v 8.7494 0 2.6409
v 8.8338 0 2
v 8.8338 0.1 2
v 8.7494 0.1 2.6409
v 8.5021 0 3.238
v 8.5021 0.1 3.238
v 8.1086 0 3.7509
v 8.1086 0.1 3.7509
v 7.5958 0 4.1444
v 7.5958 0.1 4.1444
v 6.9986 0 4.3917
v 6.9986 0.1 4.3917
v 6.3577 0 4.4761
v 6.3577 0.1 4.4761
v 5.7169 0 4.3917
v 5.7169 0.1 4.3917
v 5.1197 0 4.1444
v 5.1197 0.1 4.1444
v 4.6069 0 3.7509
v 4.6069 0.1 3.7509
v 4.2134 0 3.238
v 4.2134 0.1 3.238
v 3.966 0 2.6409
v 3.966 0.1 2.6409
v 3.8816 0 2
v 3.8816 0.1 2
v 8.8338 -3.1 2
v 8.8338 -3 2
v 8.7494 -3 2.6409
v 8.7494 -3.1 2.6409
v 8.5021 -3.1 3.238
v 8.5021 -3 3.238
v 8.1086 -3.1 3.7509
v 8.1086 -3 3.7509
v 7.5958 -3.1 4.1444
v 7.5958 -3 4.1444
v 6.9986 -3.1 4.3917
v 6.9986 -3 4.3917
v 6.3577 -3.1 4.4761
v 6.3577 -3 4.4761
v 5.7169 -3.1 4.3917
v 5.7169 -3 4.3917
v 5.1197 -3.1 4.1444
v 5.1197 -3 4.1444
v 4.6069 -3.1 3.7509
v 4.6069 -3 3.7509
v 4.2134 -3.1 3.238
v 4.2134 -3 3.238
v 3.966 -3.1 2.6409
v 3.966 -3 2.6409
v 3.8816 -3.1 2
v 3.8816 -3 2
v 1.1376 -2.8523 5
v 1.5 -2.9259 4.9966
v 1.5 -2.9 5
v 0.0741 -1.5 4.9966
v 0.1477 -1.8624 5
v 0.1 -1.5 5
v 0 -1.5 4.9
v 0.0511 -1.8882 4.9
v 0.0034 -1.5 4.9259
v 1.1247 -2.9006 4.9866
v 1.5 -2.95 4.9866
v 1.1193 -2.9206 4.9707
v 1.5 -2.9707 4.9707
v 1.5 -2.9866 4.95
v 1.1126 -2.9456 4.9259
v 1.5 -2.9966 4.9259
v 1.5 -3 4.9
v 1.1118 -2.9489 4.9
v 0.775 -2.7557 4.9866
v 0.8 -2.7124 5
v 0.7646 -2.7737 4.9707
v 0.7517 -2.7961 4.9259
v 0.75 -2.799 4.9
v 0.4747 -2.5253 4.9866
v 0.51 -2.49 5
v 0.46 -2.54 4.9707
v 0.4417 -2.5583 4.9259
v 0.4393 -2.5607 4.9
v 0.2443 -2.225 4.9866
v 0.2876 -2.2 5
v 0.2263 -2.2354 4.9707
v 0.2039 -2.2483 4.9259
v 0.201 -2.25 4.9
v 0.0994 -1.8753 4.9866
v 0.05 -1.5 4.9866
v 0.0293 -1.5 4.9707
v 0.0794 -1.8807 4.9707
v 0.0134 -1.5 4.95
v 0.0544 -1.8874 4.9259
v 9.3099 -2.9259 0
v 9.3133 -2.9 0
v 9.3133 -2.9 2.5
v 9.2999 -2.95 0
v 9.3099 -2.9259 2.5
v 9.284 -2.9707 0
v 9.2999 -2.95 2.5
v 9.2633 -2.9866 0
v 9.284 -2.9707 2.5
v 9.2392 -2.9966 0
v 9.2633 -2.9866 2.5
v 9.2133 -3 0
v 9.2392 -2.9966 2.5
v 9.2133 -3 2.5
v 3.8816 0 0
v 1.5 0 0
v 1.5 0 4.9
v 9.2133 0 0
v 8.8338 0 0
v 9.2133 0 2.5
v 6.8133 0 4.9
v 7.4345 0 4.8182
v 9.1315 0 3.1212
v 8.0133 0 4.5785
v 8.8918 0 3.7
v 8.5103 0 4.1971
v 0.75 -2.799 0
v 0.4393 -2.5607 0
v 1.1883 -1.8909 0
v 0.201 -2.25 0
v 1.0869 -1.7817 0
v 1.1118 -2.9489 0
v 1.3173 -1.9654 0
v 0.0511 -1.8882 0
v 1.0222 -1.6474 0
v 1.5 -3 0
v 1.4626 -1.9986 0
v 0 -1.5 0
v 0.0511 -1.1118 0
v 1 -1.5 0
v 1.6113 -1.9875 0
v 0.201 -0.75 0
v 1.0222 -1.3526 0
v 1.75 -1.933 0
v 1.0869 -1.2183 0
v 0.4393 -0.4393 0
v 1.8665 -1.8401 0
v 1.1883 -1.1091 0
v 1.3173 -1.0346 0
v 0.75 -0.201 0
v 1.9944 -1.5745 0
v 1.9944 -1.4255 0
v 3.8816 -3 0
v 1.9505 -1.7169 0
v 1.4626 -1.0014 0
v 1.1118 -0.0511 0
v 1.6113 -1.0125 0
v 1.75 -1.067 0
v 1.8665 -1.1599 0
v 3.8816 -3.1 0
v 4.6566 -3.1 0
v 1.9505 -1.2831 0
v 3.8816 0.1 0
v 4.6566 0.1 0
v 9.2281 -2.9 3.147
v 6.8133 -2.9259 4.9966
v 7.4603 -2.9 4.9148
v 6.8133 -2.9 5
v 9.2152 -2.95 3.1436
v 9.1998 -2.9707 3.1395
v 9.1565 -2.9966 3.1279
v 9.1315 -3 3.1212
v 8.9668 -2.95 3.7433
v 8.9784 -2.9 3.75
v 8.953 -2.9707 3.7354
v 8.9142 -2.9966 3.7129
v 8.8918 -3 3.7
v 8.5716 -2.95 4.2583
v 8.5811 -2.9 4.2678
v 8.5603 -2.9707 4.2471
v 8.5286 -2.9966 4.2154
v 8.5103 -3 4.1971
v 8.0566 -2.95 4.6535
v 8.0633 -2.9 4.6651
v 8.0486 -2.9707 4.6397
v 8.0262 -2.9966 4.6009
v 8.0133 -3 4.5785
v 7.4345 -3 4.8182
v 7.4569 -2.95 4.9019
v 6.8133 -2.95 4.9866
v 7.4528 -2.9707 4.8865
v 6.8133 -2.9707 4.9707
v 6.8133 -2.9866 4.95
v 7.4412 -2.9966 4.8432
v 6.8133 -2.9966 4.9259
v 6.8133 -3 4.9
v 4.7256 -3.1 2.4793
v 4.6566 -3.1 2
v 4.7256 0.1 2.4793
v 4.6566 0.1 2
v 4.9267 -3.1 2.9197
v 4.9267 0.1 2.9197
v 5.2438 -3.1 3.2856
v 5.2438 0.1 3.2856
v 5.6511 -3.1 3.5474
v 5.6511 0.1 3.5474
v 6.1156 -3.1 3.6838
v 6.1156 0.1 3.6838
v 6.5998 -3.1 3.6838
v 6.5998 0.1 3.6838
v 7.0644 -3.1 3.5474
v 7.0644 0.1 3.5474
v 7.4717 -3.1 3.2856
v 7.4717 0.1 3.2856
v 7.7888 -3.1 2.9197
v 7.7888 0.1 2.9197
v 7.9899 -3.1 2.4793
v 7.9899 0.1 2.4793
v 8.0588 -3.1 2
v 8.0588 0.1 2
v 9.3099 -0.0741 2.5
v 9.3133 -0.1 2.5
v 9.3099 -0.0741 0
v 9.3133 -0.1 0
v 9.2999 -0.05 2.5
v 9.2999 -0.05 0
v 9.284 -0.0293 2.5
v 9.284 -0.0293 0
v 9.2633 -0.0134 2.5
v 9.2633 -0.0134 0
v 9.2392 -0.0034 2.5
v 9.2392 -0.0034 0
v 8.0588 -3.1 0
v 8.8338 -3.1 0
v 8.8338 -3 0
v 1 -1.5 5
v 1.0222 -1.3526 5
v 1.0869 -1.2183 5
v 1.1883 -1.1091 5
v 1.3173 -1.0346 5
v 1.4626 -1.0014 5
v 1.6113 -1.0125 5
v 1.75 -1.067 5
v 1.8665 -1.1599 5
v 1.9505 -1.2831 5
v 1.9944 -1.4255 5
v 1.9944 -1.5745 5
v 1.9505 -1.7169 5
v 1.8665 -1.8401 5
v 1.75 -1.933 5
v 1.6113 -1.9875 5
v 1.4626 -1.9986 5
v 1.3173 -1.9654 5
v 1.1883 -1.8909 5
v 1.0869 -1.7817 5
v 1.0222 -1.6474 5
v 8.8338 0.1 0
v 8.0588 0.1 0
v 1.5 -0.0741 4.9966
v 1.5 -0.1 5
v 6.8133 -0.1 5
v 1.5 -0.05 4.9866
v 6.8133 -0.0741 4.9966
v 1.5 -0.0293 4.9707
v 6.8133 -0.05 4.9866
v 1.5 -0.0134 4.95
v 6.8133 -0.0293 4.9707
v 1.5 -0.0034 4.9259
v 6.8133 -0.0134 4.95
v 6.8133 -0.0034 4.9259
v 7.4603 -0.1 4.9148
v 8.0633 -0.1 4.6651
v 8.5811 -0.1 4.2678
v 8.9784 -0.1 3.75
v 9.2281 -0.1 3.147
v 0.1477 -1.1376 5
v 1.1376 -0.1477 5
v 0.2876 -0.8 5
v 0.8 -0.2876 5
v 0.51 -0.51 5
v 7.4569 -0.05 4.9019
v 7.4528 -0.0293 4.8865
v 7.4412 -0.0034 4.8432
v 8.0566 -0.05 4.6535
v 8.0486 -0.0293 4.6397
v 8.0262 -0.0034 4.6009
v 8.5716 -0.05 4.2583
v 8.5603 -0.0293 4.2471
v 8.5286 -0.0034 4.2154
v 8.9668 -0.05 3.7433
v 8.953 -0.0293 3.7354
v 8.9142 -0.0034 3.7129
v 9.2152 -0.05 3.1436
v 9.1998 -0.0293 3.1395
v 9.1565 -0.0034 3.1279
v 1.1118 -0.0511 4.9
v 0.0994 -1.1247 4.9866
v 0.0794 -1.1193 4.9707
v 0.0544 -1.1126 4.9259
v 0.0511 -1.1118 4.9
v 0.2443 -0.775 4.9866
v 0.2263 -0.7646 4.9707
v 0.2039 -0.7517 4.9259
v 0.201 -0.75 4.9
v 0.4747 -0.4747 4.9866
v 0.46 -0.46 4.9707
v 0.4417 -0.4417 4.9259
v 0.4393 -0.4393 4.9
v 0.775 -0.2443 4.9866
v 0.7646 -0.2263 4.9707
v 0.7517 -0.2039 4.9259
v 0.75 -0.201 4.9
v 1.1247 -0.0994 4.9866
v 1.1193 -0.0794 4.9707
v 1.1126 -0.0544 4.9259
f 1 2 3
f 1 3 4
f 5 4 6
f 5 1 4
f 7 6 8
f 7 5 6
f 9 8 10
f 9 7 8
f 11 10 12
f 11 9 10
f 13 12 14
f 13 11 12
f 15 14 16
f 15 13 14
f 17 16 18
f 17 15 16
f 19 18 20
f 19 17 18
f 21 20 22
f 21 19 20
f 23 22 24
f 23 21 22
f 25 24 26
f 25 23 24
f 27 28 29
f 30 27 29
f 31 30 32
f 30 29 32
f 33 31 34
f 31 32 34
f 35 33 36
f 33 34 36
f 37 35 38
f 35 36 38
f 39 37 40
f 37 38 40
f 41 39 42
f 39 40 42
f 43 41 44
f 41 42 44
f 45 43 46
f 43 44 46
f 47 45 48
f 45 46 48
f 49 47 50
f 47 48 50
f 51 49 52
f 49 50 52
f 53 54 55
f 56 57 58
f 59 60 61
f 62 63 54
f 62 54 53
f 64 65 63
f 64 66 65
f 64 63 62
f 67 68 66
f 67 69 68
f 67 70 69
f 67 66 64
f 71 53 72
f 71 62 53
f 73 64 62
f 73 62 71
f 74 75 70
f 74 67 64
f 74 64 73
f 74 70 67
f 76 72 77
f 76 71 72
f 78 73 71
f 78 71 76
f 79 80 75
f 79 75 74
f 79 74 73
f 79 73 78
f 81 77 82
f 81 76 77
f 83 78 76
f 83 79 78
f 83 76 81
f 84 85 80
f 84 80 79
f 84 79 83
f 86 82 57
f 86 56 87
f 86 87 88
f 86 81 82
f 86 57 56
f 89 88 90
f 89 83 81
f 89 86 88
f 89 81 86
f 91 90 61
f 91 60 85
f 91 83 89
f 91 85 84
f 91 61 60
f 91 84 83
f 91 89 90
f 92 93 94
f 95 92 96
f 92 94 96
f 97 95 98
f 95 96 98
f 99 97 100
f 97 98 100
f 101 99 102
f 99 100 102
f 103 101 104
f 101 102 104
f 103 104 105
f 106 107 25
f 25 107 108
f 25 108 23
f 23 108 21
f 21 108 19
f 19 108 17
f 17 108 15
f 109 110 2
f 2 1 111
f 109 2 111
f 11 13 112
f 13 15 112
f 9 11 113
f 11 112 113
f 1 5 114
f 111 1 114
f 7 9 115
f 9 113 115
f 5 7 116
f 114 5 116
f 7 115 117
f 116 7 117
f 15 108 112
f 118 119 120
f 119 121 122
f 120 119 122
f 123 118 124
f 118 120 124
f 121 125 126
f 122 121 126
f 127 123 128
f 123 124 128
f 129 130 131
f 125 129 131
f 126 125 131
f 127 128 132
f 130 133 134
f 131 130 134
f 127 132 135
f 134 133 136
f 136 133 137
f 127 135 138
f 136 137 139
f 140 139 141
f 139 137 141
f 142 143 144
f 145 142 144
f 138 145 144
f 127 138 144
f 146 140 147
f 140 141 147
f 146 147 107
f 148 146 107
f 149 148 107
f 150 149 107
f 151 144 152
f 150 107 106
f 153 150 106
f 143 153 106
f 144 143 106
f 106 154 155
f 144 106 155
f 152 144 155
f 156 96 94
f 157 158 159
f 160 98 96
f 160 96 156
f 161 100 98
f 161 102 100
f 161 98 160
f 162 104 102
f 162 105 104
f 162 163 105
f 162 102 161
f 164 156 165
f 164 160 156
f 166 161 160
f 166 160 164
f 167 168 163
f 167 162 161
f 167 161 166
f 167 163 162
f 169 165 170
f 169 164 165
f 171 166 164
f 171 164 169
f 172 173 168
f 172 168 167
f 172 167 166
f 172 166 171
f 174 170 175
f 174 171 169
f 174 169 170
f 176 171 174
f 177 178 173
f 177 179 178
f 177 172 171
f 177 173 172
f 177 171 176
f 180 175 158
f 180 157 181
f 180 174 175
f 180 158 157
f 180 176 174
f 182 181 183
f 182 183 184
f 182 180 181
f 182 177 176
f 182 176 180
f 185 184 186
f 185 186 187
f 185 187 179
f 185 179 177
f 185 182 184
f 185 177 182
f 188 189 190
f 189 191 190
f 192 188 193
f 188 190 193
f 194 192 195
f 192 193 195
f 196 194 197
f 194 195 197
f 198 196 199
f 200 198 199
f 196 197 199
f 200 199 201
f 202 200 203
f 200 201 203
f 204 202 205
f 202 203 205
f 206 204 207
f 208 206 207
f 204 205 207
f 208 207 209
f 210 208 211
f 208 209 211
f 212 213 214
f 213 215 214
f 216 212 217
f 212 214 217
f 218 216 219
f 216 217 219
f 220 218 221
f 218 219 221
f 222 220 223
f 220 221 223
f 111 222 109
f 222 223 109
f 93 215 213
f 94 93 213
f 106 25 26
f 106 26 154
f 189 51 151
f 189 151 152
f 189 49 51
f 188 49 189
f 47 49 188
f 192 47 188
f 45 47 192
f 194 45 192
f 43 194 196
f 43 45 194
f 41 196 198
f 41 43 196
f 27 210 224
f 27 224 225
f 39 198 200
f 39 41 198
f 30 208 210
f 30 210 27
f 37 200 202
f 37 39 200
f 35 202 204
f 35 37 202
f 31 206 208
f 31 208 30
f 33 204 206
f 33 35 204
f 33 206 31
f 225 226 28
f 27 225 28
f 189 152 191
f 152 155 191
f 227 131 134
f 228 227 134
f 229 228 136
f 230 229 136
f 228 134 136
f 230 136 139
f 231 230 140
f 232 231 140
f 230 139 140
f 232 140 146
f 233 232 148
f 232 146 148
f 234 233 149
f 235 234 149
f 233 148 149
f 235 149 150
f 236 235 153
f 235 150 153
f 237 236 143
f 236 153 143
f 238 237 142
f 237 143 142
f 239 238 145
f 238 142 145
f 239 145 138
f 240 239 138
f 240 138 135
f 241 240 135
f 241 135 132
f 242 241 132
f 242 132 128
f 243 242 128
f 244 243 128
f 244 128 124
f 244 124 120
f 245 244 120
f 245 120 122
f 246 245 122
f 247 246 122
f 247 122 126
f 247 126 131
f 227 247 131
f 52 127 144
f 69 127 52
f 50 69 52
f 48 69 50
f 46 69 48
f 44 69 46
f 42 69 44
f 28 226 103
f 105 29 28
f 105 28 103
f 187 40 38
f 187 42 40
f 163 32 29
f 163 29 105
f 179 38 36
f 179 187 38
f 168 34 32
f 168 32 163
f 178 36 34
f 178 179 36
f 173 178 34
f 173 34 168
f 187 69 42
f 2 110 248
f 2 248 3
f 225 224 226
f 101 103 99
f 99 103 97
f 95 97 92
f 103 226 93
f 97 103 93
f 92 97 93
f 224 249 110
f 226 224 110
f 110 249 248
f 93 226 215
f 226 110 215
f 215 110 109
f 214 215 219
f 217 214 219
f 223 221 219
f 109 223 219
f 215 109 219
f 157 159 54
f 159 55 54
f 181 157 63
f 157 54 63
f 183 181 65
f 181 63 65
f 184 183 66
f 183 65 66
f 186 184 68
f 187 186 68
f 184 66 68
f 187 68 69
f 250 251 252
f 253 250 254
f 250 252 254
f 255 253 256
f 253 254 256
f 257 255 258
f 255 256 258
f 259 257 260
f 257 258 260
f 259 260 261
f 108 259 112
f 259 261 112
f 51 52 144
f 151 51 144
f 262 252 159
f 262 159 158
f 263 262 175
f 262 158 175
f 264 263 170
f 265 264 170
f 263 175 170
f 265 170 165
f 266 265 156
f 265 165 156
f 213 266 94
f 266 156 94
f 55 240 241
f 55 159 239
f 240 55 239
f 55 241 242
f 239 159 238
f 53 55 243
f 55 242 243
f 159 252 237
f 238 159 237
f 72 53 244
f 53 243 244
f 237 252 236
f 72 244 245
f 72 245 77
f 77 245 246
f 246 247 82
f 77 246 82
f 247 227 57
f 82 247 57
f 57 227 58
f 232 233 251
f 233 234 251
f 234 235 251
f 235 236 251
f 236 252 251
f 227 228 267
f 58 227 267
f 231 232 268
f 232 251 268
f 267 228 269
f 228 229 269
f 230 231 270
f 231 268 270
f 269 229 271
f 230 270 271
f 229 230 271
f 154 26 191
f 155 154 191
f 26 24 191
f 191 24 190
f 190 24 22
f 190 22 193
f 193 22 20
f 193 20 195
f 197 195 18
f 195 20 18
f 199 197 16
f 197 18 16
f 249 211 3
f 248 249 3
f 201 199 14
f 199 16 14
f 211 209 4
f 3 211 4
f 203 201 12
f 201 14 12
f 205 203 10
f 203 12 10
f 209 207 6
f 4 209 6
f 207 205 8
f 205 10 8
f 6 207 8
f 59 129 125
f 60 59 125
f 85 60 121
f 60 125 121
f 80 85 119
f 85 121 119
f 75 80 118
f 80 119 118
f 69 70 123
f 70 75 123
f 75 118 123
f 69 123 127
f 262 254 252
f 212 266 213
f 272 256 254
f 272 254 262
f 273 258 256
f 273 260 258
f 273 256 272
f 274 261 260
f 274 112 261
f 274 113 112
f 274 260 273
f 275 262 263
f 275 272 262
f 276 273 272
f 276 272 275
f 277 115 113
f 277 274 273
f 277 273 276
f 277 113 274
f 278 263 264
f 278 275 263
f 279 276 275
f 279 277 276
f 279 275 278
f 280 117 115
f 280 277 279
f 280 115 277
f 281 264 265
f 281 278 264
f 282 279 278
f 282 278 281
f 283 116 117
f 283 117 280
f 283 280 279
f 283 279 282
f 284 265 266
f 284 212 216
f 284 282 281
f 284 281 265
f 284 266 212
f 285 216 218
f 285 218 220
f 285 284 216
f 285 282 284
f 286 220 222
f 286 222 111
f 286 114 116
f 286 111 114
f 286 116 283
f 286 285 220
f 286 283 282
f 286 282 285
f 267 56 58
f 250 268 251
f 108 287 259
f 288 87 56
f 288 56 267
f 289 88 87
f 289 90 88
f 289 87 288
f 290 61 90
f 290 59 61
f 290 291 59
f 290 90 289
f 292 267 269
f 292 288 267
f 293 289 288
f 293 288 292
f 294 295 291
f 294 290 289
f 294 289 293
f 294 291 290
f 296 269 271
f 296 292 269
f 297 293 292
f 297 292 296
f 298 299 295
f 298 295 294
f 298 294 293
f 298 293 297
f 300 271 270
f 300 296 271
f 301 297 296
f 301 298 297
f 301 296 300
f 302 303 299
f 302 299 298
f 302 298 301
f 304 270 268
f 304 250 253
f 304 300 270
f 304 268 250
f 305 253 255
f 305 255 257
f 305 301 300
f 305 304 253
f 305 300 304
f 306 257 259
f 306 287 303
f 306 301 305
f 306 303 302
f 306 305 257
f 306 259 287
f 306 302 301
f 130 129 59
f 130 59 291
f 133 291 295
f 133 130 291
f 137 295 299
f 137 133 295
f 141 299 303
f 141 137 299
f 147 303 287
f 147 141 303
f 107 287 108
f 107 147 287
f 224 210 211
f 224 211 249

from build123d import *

# Parameters (mm, degrees)
F1_DEPTH      = 3
F2_R          = 1.49999
F4_D          = 1
F5_R          = 2.5
F6_R          = 0.1
F8_DEPTH      = 0.1
F8_DEPTH_BACK = 3.1


# Not quite as in the source:
# - a fillet or chamfer is up to 0.001 mm smaller than in the source, because OpenCascade refuses the exact size


with BuildPart() as f1:
    # F0 (on Front) → F1 (new body)
    with BuildSketch(Plane.XZ):
        with BuildLine():
            Line((0, 5), (0, 0))
            Line((0, 0), (4.6566454311, 0))
            Line((4.6566454311, 0), (4.6566454311, 2))
            ThreePointArc((4.6566454311, 2), (6.3577308128, 3.7010853817), (8.0588161945, 2))
            Line((8.0588161945, 2), (8.0588161945, 0))
            Line((8.0588161945, 0), (9.3132908622, 0))
            Line((9.3132908622, 0), (9.3132908622, 5))
            Line((9.3132908622, 5), (0, 5))
        make_face()
    extrude(amount=F1_DEPTH)

    # F2 (radius 1.5 in the source; OpenCascade refuses exactly that, so slightly less here)
    f2_edges = [f1.edges().sort_by_distance(p)[0] for p in [
        (0, 0, 2.5),
        (0, -3, 2.5),
    ]]
    fillet(f2_edges, radius=F2_R)

    # F4 (through all)
    with Locations(Plane.XY.offset(5)):
        with Locations((1.5, -1.5)):
            Hole(F4_D / 2)

    # F5
    f5_edges = [f1.edges().sort_by_distance(p)[0] for p in [
        (9.313291, -1.5, 5),
    ]]
    fillet(f5_edges, radius=F5_R)

    # F6
    f6_edges = [f1.edges().sort_by_distance(p)[0] for p in [
        (4.15664, -3, 5),
        (8.581058, -3, 4.267767),
        (9.313291, -3, 1.25),
        (9.313291, 0, 1.25),
        (8.581058, 0, 4.267767),
        (4.15664, 0, 5),
    ]]
    fillet(f6_edges, radius=F6_R)

    # F7 (on face) → F8 (join, two sides)
    with BuildSketch(Plane.XZ.offset(3)) as f8_sk:
        with BuildLine():
            Line((3.8816455076, 2), (3.8816455076, 0))
            Line((3.8816455076, 0), (4.6566454311, 0))
            Line((4.6566454311, 0), (4.6566454311, 2))
            ThreePointArc((4.6566454311, 2), (6.3577308128, 3.7010853817), (8.0588161945, 2))
            Line((8.0588161945, 2), (8.0588161945, 0))
            Line((8.0588161945, 0), (8.833816118, 0))
            Line((8.833816118, 0), (8.833816118, 2))
            ThreePointArc((8.833816118, 2), (6.3577308128, 4.4760853052), (3.8816455076, 2))
        make_face()
    extrude(amount=F8_DEPTH)
    extrude(f8_sk.sketch, amount=-F8_DEPTH_BACK)


solid = f1.part
